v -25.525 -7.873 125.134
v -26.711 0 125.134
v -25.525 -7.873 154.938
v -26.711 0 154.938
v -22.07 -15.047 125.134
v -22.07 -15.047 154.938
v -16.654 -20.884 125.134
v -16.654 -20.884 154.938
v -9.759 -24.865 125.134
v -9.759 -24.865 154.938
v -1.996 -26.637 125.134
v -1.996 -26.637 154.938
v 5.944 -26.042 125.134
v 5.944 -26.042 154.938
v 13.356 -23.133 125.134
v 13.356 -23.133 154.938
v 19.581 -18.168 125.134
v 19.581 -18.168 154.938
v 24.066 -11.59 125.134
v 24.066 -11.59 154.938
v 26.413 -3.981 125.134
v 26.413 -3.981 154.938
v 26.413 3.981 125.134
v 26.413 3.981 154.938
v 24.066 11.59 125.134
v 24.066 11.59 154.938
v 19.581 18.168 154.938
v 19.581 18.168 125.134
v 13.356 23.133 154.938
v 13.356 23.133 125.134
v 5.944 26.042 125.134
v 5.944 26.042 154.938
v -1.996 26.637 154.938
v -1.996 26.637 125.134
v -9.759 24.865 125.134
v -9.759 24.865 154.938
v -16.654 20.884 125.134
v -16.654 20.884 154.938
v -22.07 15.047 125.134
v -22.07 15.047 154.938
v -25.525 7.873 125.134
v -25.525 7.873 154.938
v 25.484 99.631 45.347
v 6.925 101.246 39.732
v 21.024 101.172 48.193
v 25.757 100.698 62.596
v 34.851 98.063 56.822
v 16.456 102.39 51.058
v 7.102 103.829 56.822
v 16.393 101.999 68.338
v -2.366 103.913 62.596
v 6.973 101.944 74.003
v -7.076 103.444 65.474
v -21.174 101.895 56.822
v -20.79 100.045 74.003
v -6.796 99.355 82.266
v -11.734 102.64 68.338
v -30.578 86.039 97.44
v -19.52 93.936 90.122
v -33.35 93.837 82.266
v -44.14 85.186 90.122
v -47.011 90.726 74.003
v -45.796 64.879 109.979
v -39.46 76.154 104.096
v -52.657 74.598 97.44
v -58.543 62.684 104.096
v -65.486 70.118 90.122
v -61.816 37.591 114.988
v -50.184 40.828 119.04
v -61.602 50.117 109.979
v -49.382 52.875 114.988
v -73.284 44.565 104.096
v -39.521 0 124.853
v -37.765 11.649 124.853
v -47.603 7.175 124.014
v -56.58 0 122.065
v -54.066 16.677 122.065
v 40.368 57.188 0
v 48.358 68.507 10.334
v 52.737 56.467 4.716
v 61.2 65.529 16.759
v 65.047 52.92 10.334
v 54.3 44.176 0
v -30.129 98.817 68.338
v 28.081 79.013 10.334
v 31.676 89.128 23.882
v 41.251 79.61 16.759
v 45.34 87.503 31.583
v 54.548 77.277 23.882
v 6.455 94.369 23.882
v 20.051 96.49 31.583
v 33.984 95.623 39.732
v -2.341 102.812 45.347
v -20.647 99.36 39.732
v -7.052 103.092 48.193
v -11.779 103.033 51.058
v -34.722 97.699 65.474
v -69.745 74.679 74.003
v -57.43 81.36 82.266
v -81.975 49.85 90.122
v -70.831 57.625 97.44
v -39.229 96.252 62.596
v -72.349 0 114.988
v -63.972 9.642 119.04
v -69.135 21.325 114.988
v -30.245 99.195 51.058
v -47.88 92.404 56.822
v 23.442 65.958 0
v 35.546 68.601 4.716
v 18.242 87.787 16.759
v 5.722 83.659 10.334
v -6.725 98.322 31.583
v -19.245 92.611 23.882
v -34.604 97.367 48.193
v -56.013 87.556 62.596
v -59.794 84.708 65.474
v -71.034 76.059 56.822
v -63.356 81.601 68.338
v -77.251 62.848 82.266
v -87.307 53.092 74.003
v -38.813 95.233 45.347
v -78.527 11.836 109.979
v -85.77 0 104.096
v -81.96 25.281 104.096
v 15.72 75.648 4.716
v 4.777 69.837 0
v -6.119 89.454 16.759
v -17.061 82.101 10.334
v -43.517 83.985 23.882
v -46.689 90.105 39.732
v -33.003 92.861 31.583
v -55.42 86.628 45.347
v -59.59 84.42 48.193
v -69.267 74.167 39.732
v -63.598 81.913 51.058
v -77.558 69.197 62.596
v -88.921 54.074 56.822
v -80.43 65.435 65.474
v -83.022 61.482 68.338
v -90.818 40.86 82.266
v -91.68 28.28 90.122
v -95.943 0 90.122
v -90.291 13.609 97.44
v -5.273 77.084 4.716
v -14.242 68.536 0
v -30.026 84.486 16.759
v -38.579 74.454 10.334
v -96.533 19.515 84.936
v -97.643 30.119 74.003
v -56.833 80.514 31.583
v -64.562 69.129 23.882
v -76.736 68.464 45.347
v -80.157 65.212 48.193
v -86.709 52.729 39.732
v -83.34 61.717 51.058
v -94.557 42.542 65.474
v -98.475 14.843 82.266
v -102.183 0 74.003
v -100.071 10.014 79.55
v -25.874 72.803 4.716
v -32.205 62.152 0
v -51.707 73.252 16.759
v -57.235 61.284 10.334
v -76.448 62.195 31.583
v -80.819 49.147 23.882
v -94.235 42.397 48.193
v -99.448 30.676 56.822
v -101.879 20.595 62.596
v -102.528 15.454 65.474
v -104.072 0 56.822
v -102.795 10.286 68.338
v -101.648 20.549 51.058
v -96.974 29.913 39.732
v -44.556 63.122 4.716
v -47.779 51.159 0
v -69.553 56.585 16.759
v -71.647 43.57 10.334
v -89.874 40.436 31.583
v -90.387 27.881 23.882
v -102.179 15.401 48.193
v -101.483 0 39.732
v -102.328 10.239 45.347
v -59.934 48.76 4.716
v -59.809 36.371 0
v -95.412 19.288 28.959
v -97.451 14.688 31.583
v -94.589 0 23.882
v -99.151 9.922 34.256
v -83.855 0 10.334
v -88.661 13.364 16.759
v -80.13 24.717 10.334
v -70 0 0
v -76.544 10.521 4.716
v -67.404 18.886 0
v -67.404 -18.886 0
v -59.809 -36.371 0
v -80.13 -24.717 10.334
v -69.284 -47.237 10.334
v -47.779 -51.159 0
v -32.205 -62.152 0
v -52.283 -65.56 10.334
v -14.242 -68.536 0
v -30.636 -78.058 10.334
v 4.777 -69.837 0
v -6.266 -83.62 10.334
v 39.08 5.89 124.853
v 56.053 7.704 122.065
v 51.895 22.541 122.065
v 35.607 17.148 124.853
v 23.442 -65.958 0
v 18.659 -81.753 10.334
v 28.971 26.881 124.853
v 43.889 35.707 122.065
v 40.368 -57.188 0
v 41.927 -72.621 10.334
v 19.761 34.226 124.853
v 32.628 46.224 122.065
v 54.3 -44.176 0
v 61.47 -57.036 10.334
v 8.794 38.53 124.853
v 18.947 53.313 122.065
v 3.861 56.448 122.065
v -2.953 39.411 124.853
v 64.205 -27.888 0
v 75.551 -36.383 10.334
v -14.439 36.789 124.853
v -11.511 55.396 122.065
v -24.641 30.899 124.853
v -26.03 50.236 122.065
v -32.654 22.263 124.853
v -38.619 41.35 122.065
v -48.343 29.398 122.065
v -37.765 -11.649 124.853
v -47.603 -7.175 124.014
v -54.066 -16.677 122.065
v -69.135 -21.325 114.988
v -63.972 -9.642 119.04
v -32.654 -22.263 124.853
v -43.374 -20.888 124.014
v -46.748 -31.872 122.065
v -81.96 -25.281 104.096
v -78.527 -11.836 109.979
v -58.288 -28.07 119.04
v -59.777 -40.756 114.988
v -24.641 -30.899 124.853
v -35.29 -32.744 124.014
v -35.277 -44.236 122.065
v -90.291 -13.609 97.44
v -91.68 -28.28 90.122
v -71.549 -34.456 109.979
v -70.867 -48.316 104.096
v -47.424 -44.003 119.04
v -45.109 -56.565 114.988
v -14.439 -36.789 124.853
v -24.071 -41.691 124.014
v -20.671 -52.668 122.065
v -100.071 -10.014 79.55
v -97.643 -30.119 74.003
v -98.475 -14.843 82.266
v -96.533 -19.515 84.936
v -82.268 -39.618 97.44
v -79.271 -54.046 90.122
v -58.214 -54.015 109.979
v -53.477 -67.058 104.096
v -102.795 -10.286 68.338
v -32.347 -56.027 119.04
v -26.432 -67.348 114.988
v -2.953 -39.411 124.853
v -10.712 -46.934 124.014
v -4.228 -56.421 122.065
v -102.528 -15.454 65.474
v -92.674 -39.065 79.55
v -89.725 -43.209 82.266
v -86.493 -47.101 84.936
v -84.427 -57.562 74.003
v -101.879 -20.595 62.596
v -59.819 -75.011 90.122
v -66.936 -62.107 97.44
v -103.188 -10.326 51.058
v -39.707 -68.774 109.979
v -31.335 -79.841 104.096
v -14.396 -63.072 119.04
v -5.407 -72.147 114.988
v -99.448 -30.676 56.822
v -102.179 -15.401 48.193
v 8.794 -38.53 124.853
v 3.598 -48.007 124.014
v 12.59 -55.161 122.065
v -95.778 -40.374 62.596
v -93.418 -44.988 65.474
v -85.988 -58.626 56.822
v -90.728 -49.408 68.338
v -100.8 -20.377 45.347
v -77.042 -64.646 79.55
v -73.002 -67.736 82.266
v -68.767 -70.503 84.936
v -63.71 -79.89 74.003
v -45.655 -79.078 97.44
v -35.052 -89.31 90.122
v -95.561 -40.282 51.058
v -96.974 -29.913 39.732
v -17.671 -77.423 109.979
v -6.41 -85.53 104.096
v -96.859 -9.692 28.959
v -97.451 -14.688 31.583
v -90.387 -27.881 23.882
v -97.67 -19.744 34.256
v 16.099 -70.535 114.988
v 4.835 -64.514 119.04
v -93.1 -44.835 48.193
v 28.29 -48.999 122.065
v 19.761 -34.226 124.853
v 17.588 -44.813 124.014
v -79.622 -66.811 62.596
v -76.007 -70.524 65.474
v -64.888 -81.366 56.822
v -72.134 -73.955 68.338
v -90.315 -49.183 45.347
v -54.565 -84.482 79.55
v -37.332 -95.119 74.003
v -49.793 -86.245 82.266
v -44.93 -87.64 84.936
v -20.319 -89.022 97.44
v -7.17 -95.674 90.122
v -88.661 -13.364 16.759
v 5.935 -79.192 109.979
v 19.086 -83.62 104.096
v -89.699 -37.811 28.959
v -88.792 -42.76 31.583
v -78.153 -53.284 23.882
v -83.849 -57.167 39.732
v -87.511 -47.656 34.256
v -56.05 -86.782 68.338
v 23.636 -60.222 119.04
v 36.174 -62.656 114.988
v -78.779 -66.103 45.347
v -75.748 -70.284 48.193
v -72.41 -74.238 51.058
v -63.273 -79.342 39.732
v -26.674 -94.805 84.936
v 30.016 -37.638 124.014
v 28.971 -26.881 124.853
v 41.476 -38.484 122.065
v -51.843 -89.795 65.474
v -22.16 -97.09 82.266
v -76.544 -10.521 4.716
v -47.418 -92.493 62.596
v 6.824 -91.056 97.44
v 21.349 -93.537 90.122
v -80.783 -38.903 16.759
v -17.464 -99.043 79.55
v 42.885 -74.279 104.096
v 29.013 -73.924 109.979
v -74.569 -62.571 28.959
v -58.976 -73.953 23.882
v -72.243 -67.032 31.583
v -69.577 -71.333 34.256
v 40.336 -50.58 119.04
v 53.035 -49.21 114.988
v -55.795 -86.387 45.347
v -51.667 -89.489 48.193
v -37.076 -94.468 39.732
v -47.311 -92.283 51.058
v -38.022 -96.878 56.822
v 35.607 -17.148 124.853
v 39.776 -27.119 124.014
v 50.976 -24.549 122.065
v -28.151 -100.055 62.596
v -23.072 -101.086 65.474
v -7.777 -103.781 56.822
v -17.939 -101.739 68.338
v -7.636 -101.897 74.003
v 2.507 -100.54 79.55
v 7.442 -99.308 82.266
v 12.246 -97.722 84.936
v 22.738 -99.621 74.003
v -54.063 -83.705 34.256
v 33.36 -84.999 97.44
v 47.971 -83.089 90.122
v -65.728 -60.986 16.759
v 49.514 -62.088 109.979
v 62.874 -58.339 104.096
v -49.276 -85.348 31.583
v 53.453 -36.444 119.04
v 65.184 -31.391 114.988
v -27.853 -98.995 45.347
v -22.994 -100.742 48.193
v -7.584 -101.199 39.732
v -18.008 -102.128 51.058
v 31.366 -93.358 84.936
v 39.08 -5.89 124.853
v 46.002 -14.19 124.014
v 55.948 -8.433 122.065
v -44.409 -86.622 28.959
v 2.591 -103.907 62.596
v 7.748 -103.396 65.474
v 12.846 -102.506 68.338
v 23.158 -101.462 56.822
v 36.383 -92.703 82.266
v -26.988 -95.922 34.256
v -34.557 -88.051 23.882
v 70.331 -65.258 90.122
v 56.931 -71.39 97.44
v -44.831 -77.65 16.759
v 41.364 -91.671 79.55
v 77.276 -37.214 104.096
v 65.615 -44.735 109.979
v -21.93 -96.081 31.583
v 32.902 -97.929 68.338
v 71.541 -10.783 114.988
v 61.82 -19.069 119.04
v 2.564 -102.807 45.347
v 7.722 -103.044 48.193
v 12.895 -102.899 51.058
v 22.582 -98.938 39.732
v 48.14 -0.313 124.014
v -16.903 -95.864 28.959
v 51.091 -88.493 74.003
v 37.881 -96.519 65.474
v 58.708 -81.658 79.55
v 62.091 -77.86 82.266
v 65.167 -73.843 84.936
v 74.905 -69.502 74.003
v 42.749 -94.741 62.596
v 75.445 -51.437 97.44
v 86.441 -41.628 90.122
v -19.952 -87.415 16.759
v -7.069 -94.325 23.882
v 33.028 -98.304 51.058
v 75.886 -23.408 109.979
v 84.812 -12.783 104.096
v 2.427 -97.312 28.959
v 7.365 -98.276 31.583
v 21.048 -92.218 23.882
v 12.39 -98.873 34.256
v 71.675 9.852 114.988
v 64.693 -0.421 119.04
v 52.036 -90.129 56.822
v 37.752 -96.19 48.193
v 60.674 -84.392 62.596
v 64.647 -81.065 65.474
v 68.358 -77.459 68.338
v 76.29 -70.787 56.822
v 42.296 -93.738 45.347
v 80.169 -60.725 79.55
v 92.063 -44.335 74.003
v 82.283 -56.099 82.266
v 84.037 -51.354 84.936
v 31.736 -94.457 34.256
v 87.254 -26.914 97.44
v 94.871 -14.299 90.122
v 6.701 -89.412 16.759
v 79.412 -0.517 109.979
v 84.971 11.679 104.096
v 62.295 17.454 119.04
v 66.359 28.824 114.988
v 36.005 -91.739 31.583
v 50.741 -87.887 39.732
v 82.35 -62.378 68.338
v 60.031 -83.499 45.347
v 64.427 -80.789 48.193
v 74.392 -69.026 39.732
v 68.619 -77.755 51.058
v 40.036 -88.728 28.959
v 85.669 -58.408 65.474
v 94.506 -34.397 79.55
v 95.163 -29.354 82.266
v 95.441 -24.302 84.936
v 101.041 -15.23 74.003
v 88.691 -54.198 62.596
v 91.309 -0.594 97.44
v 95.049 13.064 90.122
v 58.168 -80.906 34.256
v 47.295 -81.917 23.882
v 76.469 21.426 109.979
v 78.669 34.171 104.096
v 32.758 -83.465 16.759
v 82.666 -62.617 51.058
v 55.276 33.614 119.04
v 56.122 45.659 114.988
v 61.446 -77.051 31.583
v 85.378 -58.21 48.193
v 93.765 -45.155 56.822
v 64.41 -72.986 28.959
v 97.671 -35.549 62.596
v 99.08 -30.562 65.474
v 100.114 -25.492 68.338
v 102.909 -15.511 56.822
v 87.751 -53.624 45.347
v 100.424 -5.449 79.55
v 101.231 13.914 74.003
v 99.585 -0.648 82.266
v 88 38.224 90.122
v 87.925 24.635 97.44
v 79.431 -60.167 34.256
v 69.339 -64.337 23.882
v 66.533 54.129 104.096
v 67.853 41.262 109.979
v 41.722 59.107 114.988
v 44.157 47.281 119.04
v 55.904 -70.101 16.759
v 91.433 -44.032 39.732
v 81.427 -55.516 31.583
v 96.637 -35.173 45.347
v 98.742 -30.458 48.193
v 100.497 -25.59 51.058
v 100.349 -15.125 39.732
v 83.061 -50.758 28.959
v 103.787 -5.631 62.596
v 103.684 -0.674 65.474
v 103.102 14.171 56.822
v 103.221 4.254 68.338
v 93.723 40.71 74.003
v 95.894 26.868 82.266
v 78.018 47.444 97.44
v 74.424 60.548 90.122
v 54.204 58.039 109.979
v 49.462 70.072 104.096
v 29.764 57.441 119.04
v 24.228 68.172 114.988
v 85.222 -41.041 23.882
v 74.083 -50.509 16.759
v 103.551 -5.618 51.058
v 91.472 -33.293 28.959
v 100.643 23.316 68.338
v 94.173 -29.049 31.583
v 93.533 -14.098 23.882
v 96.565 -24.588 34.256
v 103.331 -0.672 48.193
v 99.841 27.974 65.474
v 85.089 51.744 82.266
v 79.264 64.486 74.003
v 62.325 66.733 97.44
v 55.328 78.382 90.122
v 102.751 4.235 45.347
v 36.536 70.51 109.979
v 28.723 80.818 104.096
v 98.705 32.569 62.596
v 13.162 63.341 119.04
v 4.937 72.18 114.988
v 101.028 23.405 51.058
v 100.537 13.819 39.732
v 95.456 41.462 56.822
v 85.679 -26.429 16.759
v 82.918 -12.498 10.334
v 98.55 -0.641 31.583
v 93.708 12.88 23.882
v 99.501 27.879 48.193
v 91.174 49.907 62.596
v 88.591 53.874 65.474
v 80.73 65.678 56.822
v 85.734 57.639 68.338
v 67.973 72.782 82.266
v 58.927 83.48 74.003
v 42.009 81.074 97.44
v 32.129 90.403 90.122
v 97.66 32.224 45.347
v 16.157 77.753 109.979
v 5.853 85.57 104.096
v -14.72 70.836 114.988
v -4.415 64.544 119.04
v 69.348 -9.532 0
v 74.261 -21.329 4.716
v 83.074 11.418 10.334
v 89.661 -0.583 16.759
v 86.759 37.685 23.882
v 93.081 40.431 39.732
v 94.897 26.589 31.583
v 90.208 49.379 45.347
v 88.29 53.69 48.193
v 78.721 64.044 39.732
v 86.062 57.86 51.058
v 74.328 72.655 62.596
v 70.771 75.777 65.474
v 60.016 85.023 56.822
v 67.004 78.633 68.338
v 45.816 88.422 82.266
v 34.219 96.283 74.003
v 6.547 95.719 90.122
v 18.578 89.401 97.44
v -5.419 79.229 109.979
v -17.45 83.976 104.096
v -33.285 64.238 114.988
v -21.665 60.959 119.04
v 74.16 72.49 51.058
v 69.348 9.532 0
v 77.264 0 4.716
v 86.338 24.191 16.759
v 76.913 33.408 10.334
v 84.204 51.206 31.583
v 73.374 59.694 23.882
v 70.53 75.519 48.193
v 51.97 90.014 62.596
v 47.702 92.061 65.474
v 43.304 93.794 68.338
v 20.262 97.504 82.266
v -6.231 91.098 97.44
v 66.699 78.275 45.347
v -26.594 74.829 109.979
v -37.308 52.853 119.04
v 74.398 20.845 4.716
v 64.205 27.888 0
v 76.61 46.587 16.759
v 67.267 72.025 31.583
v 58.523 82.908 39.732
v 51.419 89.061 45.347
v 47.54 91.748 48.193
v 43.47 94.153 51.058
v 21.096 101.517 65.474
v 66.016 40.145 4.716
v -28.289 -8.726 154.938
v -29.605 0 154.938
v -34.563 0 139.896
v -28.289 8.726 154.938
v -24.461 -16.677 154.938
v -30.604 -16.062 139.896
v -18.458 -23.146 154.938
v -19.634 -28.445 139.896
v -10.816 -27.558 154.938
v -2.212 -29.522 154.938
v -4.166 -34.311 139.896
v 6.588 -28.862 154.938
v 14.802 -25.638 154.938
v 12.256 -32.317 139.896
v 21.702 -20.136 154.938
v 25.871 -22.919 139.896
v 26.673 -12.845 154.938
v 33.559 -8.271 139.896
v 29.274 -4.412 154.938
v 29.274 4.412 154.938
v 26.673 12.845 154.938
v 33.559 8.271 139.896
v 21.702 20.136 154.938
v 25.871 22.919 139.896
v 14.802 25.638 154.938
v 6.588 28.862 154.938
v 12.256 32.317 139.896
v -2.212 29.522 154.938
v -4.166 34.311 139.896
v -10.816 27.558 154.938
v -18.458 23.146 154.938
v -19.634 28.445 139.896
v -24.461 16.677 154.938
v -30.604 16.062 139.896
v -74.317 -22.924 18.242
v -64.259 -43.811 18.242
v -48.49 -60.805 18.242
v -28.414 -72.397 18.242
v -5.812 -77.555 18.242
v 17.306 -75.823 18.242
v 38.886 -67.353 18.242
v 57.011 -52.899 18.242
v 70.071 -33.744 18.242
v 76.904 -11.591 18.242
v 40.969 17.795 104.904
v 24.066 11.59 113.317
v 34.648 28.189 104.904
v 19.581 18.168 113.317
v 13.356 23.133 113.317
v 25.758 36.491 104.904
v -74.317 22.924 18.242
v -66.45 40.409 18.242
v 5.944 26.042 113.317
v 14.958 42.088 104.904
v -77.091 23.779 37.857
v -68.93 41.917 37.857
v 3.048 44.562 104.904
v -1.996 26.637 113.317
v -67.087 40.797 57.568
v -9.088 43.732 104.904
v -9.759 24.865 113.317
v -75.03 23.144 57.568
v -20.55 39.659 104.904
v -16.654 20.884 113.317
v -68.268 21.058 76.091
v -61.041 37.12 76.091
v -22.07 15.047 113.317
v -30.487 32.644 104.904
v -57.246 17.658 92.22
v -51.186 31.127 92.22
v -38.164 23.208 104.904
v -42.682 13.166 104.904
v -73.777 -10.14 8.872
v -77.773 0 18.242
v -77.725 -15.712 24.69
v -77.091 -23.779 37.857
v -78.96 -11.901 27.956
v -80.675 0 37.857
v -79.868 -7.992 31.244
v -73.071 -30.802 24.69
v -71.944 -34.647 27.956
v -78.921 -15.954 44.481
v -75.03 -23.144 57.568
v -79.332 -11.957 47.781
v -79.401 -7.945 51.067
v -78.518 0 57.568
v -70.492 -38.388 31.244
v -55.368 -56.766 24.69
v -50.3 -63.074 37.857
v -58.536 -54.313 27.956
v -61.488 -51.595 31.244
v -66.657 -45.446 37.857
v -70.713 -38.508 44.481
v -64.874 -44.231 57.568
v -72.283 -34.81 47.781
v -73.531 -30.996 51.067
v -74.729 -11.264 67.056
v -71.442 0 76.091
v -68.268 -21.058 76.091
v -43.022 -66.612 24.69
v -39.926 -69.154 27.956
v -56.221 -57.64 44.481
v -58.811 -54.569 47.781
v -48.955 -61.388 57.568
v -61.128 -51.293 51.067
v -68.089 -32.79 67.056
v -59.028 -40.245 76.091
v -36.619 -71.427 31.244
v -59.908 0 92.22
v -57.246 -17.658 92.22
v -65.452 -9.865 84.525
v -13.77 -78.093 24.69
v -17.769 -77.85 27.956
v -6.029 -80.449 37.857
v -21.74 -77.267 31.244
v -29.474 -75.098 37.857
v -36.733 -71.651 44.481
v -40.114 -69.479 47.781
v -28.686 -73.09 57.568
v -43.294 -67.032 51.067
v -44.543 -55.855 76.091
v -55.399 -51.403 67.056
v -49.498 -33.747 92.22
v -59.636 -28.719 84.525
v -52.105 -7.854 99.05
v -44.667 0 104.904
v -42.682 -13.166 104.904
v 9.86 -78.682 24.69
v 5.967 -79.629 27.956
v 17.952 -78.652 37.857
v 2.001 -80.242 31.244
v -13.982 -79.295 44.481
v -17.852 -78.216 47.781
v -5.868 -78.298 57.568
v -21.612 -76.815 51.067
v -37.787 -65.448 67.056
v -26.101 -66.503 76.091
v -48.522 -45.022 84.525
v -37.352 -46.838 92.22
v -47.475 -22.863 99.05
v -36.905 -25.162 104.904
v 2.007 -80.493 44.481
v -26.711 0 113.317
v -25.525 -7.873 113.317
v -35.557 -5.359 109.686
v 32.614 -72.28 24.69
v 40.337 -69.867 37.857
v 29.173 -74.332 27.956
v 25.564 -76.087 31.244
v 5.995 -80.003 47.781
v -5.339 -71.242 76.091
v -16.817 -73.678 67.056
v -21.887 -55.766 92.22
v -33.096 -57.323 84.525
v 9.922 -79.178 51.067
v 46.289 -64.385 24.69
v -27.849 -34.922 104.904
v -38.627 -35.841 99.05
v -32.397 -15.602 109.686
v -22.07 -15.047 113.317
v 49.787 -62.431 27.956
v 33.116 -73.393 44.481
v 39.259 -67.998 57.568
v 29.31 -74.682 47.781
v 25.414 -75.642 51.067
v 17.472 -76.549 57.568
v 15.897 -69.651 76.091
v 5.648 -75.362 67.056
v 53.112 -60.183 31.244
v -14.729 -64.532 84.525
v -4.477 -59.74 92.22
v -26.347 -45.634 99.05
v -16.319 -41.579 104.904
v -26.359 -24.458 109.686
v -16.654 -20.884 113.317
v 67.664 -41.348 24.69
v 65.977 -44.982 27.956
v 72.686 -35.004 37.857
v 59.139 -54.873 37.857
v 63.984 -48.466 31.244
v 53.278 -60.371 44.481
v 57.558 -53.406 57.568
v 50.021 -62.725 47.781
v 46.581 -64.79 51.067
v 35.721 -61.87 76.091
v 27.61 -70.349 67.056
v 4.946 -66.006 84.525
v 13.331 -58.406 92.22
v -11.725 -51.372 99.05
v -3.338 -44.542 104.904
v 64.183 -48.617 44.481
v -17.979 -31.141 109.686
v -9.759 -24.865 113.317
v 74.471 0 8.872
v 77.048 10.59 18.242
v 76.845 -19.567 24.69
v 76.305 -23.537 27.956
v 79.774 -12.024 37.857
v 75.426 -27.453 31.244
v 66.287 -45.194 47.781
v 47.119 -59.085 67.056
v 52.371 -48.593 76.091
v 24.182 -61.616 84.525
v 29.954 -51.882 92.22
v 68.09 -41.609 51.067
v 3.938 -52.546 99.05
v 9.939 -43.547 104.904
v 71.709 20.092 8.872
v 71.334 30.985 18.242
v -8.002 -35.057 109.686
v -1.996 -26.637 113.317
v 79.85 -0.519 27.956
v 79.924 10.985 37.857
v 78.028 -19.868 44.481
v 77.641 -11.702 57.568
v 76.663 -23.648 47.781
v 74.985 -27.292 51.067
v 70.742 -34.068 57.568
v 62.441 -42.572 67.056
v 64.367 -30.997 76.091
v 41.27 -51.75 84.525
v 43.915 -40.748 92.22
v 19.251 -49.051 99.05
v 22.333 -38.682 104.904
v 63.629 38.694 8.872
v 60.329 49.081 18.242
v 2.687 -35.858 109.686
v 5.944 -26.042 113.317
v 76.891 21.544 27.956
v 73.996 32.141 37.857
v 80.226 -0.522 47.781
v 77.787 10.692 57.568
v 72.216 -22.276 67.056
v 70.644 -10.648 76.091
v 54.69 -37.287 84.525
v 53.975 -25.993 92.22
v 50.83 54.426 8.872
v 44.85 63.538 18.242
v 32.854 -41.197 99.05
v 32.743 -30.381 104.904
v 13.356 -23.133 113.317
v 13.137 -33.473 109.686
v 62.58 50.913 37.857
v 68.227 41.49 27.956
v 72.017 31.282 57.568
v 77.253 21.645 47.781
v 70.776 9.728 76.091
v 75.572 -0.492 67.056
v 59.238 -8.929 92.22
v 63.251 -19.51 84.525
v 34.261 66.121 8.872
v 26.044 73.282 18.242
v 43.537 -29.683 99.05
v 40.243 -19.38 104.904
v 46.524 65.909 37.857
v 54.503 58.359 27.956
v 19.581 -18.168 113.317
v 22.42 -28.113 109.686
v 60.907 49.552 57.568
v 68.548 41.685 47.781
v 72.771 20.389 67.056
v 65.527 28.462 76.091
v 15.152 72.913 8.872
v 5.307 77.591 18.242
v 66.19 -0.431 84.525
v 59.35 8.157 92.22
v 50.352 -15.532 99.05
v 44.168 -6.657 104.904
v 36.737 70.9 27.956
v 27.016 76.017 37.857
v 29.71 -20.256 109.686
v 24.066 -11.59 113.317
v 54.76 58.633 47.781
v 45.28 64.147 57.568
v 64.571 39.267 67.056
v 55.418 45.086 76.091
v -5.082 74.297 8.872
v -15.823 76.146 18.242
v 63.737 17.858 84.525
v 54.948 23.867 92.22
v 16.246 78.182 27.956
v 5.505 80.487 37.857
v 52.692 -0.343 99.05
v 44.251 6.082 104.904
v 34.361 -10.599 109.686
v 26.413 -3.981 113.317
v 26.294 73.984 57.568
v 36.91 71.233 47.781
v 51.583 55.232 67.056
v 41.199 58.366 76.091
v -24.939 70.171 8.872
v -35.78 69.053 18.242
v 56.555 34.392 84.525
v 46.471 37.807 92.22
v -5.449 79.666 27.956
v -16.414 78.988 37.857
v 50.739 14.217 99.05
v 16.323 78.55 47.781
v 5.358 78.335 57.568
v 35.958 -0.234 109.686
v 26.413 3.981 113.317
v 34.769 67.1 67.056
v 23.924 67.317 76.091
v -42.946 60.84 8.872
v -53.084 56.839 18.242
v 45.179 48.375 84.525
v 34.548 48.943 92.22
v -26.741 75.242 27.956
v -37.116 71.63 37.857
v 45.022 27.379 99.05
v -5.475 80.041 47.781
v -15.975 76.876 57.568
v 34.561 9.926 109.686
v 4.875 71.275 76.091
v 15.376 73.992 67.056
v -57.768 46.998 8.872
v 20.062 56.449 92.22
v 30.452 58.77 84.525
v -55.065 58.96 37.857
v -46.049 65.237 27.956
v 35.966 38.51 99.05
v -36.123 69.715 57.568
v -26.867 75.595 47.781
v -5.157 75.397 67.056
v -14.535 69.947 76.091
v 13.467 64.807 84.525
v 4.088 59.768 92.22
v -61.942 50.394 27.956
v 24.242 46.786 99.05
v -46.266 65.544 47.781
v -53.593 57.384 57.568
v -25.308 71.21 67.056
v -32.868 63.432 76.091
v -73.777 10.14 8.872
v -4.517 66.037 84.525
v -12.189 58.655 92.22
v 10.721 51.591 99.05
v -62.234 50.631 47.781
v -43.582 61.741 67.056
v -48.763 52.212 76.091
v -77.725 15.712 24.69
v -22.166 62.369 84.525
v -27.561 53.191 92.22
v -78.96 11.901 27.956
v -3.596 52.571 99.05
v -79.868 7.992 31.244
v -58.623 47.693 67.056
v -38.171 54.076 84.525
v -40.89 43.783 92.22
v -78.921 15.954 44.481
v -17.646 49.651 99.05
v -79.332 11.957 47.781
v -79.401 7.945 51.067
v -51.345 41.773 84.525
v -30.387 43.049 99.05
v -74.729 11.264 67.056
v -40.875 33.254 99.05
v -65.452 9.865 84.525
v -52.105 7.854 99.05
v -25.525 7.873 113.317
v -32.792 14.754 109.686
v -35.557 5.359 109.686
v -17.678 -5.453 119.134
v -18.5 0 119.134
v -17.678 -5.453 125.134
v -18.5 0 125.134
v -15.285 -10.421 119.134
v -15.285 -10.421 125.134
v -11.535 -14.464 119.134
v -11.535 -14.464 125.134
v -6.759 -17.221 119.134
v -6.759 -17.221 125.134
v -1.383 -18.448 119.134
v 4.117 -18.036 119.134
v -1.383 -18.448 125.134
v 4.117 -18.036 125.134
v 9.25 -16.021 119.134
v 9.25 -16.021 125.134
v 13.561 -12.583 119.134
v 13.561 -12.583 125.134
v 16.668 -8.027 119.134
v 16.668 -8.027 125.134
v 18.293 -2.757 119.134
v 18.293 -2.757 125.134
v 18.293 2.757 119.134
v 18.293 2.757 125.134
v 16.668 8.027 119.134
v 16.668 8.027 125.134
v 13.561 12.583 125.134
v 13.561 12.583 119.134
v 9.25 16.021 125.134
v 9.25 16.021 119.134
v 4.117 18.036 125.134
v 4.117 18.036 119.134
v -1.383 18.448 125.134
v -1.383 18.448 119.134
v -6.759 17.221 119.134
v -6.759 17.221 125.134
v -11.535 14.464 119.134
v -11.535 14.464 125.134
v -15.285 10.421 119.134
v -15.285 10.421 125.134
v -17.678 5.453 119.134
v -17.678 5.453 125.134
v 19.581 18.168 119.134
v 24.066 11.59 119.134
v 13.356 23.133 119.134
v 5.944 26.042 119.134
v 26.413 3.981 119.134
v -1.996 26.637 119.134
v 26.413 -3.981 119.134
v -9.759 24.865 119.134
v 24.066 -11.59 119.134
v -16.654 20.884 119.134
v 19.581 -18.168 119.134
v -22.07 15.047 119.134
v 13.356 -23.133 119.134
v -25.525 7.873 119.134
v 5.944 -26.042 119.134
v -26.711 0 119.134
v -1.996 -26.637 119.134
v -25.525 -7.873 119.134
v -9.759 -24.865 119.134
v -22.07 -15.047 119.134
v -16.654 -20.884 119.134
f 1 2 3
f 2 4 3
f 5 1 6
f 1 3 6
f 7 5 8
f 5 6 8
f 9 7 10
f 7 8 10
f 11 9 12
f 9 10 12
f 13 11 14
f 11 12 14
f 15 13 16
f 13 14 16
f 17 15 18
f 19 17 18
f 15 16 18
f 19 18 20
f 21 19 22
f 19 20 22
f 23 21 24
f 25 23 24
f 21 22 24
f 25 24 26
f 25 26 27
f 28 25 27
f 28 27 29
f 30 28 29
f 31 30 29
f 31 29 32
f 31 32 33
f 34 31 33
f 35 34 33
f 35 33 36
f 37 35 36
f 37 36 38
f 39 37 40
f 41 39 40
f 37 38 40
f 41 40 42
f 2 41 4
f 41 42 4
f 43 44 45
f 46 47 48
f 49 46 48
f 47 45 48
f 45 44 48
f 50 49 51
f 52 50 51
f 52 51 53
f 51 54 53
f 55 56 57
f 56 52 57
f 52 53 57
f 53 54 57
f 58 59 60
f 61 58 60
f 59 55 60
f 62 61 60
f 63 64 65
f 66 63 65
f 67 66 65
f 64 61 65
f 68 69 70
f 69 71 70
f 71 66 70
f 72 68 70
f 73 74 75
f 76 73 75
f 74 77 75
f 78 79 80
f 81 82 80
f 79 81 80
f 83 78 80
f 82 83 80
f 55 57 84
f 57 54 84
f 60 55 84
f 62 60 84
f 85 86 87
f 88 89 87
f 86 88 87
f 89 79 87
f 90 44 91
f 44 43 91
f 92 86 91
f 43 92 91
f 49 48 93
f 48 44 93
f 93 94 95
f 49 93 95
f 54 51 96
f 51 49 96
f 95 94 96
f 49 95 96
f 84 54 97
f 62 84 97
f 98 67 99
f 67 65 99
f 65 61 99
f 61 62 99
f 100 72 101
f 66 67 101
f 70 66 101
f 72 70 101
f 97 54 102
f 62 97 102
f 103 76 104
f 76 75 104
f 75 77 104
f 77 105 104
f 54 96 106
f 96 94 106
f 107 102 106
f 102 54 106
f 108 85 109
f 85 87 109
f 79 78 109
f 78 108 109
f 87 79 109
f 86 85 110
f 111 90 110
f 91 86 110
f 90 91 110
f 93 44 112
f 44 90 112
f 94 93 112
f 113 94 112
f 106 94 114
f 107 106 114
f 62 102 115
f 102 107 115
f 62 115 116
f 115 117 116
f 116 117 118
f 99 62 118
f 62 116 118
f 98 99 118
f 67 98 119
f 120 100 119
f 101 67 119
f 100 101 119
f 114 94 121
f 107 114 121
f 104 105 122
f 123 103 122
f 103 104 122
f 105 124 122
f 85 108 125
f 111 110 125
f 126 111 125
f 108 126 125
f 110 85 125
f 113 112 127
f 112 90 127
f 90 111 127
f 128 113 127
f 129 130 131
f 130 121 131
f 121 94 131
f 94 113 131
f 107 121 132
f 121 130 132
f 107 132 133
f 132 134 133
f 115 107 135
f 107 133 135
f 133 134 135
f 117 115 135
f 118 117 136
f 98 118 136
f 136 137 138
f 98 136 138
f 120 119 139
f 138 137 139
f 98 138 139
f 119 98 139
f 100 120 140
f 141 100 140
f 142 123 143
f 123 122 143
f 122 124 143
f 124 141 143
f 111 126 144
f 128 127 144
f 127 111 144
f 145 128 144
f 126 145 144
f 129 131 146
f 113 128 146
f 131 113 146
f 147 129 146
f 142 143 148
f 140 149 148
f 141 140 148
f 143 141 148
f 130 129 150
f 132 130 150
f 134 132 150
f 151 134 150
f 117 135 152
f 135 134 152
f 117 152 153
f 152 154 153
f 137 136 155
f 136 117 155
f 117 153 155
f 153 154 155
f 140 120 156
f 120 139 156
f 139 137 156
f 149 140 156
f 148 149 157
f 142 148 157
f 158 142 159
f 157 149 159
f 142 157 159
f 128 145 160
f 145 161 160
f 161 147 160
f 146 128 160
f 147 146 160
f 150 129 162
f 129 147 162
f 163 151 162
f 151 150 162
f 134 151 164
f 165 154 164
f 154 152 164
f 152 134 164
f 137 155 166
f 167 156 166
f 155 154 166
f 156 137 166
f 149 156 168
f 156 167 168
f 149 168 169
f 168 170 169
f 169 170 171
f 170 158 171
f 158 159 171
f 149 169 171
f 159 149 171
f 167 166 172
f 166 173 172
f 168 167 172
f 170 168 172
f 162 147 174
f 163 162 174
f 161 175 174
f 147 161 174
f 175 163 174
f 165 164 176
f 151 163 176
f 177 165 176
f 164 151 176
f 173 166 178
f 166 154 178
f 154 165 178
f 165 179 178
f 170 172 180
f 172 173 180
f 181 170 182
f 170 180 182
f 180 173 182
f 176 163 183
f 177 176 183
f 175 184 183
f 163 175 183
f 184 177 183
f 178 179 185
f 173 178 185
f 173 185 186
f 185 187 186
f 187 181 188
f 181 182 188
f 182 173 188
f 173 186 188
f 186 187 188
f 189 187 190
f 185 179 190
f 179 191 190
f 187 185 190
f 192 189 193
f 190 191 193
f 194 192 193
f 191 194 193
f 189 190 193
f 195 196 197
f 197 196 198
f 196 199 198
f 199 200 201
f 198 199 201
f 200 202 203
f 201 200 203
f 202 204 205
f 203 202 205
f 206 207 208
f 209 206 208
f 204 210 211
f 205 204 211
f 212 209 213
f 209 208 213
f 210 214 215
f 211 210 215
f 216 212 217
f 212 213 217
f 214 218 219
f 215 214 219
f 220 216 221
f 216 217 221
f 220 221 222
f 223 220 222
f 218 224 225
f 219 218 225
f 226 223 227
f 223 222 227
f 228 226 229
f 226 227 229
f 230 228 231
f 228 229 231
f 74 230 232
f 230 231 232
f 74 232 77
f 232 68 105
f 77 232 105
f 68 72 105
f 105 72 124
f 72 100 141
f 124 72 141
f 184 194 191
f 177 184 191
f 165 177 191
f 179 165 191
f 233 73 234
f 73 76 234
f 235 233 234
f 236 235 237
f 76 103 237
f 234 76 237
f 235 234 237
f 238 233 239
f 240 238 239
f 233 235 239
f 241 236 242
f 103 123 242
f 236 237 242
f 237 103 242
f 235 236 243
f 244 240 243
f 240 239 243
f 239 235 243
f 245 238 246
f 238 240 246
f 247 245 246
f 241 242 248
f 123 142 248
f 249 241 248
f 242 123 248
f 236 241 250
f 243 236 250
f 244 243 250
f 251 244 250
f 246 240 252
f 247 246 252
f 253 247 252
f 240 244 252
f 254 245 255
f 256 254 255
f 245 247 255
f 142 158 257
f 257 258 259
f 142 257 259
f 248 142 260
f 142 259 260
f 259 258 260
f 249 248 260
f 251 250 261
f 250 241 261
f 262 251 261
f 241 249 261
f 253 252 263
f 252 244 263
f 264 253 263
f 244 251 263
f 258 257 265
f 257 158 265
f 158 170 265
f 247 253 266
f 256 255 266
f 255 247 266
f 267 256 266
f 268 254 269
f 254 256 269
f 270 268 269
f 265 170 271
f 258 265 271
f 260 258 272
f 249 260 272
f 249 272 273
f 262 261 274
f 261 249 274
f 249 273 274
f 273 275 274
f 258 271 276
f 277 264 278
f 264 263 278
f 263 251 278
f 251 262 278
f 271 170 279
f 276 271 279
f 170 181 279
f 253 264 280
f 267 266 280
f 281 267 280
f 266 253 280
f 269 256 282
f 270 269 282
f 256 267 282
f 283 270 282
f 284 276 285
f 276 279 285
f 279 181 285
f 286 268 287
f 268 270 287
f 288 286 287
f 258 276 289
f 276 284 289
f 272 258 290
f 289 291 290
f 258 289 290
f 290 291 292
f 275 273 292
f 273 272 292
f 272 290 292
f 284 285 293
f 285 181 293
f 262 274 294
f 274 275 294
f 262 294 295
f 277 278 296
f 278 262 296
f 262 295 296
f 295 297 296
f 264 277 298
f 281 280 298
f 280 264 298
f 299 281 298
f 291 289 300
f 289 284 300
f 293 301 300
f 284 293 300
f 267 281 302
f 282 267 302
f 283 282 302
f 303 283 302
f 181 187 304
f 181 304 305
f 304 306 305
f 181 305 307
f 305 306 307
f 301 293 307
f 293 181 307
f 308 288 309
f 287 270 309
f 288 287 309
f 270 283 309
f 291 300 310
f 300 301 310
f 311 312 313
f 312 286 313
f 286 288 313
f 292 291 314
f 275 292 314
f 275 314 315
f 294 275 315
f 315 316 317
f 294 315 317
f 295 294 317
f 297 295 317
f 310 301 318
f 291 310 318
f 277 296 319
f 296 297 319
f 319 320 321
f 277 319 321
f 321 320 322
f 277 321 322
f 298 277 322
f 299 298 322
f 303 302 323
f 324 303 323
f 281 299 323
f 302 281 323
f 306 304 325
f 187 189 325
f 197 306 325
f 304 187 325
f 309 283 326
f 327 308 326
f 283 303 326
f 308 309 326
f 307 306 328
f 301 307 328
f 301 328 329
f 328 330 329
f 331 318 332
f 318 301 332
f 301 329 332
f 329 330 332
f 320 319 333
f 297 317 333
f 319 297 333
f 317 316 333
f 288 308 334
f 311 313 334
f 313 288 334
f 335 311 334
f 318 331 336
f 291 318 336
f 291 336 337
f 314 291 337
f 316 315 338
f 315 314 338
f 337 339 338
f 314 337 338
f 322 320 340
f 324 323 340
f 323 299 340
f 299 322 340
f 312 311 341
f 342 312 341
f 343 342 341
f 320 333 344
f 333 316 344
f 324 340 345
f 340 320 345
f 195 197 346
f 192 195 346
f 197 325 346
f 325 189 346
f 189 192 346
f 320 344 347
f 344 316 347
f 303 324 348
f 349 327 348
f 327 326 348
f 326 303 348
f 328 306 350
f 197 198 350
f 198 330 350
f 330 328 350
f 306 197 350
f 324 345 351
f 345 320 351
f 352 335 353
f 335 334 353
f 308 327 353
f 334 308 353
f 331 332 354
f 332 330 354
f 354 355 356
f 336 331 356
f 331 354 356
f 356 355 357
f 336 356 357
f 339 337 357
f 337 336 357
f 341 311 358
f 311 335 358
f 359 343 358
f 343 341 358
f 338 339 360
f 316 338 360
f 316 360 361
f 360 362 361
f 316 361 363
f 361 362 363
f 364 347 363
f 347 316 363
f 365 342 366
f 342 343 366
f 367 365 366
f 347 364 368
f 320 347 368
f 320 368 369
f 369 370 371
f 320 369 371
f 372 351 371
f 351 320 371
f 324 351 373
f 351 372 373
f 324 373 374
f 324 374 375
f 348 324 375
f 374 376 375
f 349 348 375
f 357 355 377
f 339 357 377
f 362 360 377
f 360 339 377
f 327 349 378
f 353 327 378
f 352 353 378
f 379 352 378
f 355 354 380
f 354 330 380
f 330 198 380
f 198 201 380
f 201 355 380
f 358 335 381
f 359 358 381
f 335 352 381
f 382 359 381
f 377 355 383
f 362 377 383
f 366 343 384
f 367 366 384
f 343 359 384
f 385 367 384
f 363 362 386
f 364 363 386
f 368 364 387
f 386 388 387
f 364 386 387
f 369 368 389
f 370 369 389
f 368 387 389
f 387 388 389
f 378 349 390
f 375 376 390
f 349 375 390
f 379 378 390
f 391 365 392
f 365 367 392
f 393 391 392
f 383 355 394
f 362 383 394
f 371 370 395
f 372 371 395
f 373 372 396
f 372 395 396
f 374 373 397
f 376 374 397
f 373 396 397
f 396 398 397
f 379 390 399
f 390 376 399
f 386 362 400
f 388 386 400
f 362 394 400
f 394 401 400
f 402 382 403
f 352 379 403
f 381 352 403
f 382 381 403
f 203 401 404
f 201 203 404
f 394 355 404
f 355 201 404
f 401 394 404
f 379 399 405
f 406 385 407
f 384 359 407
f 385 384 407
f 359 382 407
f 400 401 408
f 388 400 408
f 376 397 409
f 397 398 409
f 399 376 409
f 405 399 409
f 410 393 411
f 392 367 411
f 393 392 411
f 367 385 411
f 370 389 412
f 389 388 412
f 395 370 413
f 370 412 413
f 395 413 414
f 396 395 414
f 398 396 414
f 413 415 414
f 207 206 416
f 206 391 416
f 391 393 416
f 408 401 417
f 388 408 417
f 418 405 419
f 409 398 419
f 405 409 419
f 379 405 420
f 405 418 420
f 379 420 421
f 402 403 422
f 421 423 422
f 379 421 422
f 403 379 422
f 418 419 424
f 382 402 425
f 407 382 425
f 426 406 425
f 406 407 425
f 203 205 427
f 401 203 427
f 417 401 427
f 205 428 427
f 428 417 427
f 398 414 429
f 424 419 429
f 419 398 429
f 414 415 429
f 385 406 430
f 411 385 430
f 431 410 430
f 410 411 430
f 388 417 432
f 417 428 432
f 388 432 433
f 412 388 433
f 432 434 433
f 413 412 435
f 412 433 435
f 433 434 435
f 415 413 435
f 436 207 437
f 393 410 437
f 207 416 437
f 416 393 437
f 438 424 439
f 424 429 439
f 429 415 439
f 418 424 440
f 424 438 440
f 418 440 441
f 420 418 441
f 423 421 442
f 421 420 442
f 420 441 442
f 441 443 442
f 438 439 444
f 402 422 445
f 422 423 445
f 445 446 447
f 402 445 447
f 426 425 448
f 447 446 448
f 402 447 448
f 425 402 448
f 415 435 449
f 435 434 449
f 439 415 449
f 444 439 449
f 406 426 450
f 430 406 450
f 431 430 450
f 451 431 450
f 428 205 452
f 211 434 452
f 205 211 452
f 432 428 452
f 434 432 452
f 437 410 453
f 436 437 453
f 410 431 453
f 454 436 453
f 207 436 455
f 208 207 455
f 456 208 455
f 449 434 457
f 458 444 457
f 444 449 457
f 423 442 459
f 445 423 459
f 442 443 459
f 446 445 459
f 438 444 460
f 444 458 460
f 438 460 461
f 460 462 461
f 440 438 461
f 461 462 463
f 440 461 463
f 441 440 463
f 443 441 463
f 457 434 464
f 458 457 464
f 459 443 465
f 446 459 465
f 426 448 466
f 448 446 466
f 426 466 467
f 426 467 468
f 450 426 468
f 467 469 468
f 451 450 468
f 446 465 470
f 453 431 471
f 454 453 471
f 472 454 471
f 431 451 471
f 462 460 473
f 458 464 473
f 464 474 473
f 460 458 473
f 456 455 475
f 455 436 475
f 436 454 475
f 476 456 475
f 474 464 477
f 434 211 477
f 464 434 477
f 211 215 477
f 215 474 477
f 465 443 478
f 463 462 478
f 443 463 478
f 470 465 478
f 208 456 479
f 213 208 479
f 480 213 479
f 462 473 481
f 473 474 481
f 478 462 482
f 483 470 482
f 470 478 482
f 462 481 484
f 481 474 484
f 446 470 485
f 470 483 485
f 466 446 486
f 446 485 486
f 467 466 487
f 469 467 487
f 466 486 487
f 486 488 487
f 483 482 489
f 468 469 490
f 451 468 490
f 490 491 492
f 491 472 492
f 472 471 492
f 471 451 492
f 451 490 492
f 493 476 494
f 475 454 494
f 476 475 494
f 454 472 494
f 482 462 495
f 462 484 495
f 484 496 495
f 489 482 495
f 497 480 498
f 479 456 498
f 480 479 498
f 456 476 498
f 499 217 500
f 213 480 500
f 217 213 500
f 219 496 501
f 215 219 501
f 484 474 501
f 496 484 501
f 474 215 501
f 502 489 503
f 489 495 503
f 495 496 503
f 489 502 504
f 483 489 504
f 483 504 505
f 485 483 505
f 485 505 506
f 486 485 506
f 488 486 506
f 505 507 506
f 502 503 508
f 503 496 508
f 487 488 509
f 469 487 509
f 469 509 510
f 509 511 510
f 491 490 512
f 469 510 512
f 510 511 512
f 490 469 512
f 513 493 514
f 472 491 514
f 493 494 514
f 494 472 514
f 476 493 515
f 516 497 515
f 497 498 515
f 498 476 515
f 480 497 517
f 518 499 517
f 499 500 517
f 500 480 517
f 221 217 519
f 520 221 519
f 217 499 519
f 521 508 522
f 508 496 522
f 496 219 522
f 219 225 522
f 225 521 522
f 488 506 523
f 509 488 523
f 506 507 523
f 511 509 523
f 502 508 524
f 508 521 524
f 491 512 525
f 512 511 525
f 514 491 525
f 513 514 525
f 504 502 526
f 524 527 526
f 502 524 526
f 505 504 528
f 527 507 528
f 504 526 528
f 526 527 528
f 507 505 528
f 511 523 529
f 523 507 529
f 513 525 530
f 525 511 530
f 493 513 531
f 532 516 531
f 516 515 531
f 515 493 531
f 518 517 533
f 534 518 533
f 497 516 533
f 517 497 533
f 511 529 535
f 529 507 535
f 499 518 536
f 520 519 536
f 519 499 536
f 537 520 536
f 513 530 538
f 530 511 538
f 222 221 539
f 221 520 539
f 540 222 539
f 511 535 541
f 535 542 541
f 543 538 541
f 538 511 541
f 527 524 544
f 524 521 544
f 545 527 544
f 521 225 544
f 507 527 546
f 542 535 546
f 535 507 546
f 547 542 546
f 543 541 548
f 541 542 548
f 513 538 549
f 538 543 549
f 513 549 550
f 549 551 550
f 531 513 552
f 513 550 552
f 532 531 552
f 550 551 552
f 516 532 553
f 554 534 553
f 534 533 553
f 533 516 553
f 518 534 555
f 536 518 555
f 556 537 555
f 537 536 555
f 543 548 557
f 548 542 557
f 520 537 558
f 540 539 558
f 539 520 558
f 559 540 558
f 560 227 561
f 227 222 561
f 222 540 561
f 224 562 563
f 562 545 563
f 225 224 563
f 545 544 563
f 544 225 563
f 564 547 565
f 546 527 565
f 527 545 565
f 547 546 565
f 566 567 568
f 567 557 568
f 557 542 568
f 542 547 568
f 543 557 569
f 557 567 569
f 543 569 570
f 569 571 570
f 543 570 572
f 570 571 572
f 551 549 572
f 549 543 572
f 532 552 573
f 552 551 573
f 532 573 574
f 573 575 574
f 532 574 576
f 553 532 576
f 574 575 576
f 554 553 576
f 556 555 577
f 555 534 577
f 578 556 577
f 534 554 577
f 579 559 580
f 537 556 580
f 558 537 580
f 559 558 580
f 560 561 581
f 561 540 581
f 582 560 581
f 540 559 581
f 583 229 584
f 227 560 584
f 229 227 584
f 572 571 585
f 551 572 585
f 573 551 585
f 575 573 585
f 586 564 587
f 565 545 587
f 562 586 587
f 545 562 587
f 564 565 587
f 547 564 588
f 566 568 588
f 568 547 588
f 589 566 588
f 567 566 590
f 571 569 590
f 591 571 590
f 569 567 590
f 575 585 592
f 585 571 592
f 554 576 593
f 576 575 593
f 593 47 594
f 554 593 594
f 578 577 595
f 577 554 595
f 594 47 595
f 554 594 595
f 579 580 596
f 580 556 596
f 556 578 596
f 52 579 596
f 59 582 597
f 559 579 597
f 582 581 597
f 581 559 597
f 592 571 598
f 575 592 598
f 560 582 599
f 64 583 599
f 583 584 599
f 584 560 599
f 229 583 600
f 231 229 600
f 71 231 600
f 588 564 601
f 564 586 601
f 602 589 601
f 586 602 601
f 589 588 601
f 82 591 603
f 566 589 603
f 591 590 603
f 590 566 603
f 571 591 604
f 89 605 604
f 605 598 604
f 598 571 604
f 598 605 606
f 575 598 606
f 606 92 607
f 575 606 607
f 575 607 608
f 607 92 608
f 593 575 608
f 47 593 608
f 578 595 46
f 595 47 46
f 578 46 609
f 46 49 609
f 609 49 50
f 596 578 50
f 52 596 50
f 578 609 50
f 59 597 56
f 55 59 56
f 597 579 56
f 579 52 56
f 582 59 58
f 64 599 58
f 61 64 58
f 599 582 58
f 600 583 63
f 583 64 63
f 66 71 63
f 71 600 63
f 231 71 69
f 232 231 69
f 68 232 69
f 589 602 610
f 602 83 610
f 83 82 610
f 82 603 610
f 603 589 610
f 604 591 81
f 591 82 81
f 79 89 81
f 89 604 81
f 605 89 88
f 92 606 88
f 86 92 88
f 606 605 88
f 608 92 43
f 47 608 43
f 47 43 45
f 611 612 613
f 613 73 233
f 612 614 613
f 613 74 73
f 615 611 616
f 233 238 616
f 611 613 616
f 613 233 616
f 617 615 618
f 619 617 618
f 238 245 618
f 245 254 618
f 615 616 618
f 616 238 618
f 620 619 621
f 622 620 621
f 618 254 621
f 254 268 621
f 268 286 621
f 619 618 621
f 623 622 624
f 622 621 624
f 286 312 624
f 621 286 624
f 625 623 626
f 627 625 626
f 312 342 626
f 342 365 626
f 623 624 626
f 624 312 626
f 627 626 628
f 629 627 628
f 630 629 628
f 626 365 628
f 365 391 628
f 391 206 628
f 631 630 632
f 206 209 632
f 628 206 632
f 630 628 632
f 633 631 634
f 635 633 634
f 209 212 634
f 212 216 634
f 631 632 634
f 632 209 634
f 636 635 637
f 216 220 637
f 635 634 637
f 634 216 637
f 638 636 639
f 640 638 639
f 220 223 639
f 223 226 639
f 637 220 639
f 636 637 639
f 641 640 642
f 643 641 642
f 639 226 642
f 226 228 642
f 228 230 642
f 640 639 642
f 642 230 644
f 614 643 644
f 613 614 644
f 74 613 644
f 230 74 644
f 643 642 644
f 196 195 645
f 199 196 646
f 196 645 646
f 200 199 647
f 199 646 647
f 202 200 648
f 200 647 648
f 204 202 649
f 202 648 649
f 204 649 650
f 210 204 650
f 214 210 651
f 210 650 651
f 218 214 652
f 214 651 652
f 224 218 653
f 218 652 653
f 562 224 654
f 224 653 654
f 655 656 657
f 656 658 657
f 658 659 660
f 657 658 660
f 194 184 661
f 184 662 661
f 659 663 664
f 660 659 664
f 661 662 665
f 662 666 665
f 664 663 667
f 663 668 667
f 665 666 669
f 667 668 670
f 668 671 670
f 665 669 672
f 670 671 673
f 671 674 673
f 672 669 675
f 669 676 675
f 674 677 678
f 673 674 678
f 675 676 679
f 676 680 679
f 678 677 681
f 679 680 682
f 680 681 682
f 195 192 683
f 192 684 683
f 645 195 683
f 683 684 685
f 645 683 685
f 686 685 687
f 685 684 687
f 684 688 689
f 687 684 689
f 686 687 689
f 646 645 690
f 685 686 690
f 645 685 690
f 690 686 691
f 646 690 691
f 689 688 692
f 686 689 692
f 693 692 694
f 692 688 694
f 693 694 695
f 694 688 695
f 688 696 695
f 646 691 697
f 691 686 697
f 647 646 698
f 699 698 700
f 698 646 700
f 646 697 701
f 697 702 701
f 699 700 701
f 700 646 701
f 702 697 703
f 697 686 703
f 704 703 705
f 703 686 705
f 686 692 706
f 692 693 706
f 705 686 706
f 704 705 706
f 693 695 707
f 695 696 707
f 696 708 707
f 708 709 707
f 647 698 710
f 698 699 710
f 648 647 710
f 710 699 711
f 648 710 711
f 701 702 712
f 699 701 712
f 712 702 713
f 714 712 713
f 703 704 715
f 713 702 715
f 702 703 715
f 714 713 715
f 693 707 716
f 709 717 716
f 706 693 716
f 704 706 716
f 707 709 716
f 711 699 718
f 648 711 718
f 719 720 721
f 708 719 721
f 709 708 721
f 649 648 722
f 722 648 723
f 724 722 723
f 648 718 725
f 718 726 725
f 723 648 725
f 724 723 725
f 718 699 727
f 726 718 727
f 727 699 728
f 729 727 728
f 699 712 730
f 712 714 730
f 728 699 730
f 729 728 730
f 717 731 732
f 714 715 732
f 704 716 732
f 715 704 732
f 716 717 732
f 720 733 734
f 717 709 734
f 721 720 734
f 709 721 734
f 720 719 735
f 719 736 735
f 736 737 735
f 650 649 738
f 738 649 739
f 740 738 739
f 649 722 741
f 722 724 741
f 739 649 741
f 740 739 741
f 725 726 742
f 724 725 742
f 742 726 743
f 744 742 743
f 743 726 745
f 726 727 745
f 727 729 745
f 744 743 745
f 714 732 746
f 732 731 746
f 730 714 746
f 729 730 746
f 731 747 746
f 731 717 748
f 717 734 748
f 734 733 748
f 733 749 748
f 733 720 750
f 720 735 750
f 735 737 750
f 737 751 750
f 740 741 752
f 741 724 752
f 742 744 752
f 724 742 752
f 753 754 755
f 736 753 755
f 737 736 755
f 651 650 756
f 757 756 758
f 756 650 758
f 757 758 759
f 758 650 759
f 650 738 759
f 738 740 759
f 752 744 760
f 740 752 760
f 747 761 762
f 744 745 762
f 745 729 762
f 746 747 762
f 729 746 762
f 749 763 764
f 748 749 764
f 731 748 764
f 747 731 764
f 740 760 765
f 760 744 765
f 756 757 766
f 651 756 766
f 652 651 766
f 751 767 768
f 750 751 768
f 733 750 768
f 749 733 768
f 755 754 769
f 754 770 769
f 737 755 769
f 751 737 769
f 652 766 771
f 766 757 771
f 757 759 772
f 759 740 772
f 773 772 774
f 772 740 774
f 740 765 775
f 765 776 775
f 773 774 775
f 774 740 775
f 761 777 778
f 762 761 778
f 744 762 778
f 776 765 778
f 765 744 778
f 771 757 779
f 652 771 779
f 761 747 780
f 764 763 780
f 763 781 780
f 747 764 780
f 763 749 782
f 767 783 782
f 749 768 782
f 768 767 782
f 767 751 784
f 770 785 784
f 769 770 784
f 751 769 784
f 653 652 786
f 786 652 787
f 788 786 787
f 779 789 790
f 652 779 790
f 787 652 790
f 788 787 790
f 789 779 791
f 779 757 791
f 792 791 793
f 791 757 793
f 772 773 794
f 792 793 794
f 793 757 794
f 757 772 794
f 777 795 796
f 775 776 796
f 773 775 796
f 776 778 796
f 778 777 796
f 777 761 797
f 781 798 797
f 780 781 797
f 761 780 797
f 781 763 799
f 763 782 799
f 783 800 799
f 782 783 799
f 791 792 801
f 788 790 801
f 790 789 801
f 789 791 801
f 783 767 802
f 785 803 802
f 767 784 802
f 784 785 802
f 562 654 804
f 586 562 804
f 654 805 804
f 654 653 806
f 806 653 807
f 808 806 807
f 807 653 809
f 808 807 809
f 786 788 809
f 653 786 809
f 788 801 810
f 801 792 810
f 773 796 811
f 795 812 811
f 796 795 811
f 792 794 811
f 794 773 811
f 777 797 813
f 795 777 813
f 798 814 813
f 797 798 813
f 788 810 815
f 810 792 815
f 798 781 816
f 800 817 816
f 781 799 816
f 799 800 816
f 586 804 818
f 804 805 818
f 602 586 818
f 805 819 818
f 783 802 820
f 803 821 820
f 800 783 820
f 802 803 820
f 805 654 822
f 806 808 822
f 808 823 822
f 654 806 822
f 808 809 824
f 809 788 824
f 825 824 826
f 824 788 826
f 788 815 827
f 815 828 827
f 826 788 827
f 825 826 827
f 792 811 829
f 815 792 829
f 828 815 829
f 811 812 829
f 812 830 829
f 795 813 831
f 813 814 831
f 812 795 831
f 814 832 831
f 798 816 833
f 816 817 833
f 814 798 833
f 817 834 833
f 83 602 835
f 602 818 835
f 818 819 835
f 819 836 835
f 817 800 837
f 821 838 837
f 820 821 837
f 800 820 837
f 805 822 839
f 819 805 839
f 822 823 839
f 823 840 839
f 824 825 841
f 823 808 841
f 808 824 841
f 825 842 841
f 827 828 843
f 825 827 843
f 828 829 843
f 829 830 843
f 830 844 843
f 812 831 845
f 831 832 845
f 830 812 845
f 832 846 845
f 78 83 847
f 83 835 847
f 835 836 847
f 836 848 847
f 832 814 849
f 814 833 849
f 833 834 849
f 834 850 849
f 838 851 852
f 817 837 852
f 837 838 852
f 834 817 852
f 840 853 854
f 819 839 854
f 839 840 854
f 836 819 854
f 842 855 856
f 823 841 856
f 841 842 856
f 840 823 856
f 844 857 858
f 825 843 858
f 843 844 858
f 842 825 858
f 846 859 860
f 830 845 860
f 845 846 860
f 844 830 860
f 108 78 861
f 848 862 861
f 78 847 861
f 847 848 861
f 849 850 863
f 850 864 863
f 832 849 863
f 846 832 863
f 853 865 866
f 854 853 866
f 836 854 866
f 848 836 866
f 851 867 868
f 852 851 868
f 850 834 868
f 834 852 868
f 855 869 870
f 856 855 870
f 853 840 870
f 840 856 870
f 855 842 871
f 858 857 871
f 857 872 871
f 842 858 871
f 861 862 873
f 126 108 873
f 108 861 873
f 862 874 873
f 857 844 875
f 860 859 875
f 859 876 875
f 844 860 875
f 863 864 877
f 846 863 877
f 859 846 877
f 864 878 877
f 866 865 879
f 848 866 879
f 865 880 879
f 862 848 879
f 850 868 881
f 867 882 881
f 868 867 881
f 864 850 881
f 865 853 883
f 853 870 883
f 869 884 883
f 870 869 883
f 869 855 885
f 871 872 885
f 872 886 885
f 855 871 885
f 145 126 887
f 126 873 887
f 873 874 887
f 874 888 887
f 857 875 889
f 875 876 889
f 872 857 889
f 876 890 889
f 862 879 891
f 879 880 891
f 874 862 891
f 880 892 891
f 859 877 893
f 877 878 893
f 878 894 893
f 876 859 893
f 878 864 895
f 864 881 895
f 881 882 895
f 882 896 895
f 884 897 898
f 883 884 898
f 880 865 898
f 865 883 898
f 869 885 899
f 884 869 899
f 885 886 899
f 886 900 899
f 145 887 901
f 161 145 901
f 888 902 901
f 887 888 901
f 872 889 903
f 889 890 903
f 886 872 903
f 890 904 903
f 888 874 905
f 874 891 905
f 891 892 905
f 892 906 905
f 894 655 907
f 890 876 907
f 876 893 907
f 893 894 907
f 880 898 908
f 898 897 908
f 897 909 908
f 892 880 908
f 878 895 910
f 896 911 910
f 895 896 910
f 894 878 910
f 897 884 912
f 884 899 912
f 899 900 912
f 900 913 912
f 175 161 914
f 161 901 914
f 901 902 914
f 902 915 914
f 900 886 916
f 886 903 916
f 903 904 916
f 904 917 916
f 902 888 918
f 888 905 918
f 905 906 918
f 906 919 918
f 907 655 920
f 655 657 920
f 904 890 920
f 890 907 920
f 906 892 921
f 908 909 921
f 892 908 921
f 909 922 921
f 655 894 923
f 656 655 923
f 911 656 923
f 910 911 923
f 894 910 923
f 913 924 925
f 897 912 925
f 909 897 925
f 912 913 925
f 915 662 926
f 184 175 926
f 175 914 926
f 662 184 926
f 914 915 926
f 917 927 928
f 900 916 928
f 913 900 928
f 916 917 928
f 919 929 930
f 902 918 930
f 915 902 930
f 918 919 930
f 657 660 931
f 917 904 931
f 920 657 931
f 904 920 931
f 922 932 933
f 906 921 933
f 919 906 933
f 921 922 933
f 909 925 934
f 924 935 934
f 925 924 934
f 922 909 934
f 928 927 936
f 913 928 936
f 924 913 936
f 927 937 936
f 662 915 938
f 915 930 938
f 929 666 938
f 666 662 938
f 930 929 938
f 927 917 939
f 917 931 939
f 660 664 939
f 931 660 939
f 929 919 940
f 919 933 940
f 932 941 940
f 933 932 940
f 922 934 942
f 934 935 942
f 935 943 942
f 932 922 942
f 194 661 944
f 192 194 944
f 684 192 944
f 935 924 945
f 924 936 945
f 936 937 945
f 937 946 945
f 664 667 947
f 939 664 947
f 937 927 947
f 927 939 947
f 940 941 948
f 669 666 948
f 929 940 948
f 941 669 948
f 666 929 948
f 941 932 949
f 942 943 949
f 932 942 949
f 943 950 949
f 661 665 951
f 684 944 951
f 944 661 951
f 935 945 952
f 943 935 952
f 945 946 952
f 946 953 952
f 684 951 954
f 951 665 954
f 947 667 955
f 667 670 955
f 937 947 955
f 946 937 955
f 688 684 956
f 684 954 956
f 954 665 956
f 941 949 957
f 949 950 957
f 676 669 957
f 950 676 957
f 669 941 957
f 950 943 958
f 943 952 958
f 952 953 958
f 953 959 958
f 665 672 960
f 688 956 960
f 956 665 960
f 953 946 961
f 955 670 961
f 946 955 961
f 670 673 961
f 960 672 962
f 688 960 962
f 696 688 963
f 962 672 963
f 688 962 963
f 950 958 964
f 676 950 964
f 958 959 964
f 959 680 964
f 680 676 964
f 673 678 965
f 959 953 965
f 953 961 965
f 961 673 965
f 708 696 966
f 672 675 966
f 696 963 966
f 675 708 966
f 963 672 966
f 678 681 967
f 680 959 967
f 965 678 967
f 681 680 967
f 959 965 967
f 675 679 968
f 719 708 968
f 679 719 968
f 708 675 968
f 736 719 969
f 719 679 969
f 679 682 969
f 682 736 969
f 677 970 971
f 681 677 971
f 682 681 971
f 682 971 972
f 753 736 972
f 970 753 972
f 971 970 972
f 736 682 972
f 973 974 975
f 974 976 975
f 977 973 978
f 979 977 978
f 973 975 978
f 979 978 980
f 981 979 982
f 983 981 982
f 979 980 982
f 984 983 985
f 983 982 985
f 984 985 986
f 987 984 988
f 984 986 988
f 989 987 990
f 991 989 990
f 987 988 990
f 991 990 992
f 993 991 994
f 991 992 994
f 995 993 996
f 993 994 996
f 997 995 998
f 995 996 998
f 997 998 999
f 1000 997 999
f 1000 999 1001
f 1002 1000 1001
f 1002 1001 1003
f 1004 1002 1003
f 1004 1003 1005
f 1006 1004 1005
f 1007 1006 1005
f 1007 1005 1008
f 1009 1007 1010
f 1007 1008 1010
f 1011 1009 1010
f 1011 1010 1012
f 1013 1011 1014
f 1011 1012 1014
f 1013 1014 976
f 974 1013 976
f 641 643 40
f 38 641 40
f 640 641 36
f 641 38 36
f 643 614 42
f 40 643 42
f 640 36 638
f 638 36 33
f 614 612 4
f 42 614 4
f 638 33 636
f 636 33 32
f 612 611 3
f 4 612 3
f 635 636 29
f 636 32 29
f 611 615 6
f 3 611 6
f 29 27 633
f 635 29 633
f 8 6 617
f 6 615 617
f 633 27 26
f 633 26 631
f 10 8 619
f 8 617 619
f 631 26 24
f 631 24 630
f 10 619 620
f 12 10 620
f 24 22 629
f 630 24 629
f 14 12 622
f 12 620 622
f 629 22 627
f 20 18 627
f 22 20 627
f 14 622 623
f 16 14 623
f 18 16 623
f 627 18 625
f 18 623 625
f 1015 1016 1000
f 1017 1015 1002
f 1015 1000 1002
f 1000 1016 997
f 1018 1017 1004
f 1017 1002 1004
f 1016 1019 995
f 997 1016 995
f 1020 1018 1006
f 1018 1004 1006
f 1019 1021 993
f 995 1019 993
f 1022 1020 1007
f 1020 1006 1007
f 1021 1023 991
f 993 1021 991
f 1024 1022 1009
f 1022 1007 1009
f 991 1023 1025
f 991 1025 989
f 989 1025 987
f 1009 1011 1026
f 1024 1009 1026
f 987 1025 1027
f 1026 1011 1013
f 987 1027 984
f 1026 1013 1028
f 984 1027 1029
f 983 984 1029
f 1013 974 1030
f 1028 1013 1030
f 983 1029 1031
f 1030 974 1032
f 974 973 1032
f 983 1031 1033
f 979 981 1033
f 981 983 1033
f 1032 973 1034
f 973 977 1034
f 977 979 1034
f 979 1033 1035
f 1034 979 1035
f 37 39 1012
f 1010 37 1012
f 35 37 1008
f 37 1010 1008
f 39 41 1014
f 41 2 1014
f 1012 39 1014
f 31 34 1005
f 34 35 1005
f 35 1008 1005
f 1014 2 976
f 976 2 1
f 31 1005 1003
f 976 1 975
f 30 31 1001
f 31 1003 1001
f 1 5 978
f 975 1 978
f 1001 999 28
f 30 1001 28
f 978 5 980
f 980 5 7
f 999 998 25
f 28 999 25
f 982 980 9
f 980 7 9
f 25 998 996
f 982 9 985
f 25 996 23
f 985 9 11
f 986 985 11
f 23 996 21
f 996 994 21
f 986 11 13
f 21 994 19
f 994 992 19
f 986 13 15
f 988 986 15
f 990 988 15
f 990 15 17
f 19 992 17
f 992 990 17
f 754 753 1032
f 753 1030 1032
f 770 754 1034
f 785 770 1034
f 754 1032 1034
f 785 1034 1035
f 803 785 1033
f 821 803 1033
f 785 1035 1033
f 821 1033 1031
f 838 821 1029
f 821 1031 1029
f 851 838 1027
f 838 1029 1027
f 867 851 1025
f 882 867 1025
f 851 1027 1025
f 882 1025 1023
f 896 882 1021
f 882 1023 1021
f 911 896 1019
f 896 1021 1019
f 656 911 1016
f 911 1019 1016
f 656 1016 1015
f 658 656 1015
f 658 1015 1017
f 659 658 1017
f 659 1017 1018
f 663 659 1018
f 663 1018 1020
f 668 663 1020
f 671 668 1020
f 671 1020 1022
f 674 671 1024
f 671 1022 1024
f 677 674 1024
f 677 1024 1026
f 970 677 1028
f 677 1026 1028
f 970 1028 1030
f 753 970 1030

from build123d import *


with BuildPart() as f1:
    # F0 (on Front) → F1 (revolve)
    with BuildSketch(Plane.XZ):
        with BuildLine():
            ThreePointArc((-70, 0), (-75.573115, 67.056037), (-26.711296, 113.317191))
            Line((-26.711296, 113.317191), (-26.711296, 119.133913))
            Line((-26.711296, 119.133913), (-18.5, 119.133913))
            Line((-18.5, 119.133913), (-18.5, 125.133913))
            Line((-18.5, 125.133913), (-26.711296, 125.133913))
            Line((-26.711296, 125.133913), (-26.711296, 154.938141))
            Line((-26.711296, 154.938141), (-29.60469, 154.938141))
            Line((-29.60469, 154.938141), (-39.521277, 124.853122))
            ThreePointArc((-39.521277, 124.853122), (-102.18268, 74.00307), (-70, 0))
        make_face()
    revolve(axis=Axis((0, 0, 81.804797), (0, 0, 1)))


solid = f1.part
